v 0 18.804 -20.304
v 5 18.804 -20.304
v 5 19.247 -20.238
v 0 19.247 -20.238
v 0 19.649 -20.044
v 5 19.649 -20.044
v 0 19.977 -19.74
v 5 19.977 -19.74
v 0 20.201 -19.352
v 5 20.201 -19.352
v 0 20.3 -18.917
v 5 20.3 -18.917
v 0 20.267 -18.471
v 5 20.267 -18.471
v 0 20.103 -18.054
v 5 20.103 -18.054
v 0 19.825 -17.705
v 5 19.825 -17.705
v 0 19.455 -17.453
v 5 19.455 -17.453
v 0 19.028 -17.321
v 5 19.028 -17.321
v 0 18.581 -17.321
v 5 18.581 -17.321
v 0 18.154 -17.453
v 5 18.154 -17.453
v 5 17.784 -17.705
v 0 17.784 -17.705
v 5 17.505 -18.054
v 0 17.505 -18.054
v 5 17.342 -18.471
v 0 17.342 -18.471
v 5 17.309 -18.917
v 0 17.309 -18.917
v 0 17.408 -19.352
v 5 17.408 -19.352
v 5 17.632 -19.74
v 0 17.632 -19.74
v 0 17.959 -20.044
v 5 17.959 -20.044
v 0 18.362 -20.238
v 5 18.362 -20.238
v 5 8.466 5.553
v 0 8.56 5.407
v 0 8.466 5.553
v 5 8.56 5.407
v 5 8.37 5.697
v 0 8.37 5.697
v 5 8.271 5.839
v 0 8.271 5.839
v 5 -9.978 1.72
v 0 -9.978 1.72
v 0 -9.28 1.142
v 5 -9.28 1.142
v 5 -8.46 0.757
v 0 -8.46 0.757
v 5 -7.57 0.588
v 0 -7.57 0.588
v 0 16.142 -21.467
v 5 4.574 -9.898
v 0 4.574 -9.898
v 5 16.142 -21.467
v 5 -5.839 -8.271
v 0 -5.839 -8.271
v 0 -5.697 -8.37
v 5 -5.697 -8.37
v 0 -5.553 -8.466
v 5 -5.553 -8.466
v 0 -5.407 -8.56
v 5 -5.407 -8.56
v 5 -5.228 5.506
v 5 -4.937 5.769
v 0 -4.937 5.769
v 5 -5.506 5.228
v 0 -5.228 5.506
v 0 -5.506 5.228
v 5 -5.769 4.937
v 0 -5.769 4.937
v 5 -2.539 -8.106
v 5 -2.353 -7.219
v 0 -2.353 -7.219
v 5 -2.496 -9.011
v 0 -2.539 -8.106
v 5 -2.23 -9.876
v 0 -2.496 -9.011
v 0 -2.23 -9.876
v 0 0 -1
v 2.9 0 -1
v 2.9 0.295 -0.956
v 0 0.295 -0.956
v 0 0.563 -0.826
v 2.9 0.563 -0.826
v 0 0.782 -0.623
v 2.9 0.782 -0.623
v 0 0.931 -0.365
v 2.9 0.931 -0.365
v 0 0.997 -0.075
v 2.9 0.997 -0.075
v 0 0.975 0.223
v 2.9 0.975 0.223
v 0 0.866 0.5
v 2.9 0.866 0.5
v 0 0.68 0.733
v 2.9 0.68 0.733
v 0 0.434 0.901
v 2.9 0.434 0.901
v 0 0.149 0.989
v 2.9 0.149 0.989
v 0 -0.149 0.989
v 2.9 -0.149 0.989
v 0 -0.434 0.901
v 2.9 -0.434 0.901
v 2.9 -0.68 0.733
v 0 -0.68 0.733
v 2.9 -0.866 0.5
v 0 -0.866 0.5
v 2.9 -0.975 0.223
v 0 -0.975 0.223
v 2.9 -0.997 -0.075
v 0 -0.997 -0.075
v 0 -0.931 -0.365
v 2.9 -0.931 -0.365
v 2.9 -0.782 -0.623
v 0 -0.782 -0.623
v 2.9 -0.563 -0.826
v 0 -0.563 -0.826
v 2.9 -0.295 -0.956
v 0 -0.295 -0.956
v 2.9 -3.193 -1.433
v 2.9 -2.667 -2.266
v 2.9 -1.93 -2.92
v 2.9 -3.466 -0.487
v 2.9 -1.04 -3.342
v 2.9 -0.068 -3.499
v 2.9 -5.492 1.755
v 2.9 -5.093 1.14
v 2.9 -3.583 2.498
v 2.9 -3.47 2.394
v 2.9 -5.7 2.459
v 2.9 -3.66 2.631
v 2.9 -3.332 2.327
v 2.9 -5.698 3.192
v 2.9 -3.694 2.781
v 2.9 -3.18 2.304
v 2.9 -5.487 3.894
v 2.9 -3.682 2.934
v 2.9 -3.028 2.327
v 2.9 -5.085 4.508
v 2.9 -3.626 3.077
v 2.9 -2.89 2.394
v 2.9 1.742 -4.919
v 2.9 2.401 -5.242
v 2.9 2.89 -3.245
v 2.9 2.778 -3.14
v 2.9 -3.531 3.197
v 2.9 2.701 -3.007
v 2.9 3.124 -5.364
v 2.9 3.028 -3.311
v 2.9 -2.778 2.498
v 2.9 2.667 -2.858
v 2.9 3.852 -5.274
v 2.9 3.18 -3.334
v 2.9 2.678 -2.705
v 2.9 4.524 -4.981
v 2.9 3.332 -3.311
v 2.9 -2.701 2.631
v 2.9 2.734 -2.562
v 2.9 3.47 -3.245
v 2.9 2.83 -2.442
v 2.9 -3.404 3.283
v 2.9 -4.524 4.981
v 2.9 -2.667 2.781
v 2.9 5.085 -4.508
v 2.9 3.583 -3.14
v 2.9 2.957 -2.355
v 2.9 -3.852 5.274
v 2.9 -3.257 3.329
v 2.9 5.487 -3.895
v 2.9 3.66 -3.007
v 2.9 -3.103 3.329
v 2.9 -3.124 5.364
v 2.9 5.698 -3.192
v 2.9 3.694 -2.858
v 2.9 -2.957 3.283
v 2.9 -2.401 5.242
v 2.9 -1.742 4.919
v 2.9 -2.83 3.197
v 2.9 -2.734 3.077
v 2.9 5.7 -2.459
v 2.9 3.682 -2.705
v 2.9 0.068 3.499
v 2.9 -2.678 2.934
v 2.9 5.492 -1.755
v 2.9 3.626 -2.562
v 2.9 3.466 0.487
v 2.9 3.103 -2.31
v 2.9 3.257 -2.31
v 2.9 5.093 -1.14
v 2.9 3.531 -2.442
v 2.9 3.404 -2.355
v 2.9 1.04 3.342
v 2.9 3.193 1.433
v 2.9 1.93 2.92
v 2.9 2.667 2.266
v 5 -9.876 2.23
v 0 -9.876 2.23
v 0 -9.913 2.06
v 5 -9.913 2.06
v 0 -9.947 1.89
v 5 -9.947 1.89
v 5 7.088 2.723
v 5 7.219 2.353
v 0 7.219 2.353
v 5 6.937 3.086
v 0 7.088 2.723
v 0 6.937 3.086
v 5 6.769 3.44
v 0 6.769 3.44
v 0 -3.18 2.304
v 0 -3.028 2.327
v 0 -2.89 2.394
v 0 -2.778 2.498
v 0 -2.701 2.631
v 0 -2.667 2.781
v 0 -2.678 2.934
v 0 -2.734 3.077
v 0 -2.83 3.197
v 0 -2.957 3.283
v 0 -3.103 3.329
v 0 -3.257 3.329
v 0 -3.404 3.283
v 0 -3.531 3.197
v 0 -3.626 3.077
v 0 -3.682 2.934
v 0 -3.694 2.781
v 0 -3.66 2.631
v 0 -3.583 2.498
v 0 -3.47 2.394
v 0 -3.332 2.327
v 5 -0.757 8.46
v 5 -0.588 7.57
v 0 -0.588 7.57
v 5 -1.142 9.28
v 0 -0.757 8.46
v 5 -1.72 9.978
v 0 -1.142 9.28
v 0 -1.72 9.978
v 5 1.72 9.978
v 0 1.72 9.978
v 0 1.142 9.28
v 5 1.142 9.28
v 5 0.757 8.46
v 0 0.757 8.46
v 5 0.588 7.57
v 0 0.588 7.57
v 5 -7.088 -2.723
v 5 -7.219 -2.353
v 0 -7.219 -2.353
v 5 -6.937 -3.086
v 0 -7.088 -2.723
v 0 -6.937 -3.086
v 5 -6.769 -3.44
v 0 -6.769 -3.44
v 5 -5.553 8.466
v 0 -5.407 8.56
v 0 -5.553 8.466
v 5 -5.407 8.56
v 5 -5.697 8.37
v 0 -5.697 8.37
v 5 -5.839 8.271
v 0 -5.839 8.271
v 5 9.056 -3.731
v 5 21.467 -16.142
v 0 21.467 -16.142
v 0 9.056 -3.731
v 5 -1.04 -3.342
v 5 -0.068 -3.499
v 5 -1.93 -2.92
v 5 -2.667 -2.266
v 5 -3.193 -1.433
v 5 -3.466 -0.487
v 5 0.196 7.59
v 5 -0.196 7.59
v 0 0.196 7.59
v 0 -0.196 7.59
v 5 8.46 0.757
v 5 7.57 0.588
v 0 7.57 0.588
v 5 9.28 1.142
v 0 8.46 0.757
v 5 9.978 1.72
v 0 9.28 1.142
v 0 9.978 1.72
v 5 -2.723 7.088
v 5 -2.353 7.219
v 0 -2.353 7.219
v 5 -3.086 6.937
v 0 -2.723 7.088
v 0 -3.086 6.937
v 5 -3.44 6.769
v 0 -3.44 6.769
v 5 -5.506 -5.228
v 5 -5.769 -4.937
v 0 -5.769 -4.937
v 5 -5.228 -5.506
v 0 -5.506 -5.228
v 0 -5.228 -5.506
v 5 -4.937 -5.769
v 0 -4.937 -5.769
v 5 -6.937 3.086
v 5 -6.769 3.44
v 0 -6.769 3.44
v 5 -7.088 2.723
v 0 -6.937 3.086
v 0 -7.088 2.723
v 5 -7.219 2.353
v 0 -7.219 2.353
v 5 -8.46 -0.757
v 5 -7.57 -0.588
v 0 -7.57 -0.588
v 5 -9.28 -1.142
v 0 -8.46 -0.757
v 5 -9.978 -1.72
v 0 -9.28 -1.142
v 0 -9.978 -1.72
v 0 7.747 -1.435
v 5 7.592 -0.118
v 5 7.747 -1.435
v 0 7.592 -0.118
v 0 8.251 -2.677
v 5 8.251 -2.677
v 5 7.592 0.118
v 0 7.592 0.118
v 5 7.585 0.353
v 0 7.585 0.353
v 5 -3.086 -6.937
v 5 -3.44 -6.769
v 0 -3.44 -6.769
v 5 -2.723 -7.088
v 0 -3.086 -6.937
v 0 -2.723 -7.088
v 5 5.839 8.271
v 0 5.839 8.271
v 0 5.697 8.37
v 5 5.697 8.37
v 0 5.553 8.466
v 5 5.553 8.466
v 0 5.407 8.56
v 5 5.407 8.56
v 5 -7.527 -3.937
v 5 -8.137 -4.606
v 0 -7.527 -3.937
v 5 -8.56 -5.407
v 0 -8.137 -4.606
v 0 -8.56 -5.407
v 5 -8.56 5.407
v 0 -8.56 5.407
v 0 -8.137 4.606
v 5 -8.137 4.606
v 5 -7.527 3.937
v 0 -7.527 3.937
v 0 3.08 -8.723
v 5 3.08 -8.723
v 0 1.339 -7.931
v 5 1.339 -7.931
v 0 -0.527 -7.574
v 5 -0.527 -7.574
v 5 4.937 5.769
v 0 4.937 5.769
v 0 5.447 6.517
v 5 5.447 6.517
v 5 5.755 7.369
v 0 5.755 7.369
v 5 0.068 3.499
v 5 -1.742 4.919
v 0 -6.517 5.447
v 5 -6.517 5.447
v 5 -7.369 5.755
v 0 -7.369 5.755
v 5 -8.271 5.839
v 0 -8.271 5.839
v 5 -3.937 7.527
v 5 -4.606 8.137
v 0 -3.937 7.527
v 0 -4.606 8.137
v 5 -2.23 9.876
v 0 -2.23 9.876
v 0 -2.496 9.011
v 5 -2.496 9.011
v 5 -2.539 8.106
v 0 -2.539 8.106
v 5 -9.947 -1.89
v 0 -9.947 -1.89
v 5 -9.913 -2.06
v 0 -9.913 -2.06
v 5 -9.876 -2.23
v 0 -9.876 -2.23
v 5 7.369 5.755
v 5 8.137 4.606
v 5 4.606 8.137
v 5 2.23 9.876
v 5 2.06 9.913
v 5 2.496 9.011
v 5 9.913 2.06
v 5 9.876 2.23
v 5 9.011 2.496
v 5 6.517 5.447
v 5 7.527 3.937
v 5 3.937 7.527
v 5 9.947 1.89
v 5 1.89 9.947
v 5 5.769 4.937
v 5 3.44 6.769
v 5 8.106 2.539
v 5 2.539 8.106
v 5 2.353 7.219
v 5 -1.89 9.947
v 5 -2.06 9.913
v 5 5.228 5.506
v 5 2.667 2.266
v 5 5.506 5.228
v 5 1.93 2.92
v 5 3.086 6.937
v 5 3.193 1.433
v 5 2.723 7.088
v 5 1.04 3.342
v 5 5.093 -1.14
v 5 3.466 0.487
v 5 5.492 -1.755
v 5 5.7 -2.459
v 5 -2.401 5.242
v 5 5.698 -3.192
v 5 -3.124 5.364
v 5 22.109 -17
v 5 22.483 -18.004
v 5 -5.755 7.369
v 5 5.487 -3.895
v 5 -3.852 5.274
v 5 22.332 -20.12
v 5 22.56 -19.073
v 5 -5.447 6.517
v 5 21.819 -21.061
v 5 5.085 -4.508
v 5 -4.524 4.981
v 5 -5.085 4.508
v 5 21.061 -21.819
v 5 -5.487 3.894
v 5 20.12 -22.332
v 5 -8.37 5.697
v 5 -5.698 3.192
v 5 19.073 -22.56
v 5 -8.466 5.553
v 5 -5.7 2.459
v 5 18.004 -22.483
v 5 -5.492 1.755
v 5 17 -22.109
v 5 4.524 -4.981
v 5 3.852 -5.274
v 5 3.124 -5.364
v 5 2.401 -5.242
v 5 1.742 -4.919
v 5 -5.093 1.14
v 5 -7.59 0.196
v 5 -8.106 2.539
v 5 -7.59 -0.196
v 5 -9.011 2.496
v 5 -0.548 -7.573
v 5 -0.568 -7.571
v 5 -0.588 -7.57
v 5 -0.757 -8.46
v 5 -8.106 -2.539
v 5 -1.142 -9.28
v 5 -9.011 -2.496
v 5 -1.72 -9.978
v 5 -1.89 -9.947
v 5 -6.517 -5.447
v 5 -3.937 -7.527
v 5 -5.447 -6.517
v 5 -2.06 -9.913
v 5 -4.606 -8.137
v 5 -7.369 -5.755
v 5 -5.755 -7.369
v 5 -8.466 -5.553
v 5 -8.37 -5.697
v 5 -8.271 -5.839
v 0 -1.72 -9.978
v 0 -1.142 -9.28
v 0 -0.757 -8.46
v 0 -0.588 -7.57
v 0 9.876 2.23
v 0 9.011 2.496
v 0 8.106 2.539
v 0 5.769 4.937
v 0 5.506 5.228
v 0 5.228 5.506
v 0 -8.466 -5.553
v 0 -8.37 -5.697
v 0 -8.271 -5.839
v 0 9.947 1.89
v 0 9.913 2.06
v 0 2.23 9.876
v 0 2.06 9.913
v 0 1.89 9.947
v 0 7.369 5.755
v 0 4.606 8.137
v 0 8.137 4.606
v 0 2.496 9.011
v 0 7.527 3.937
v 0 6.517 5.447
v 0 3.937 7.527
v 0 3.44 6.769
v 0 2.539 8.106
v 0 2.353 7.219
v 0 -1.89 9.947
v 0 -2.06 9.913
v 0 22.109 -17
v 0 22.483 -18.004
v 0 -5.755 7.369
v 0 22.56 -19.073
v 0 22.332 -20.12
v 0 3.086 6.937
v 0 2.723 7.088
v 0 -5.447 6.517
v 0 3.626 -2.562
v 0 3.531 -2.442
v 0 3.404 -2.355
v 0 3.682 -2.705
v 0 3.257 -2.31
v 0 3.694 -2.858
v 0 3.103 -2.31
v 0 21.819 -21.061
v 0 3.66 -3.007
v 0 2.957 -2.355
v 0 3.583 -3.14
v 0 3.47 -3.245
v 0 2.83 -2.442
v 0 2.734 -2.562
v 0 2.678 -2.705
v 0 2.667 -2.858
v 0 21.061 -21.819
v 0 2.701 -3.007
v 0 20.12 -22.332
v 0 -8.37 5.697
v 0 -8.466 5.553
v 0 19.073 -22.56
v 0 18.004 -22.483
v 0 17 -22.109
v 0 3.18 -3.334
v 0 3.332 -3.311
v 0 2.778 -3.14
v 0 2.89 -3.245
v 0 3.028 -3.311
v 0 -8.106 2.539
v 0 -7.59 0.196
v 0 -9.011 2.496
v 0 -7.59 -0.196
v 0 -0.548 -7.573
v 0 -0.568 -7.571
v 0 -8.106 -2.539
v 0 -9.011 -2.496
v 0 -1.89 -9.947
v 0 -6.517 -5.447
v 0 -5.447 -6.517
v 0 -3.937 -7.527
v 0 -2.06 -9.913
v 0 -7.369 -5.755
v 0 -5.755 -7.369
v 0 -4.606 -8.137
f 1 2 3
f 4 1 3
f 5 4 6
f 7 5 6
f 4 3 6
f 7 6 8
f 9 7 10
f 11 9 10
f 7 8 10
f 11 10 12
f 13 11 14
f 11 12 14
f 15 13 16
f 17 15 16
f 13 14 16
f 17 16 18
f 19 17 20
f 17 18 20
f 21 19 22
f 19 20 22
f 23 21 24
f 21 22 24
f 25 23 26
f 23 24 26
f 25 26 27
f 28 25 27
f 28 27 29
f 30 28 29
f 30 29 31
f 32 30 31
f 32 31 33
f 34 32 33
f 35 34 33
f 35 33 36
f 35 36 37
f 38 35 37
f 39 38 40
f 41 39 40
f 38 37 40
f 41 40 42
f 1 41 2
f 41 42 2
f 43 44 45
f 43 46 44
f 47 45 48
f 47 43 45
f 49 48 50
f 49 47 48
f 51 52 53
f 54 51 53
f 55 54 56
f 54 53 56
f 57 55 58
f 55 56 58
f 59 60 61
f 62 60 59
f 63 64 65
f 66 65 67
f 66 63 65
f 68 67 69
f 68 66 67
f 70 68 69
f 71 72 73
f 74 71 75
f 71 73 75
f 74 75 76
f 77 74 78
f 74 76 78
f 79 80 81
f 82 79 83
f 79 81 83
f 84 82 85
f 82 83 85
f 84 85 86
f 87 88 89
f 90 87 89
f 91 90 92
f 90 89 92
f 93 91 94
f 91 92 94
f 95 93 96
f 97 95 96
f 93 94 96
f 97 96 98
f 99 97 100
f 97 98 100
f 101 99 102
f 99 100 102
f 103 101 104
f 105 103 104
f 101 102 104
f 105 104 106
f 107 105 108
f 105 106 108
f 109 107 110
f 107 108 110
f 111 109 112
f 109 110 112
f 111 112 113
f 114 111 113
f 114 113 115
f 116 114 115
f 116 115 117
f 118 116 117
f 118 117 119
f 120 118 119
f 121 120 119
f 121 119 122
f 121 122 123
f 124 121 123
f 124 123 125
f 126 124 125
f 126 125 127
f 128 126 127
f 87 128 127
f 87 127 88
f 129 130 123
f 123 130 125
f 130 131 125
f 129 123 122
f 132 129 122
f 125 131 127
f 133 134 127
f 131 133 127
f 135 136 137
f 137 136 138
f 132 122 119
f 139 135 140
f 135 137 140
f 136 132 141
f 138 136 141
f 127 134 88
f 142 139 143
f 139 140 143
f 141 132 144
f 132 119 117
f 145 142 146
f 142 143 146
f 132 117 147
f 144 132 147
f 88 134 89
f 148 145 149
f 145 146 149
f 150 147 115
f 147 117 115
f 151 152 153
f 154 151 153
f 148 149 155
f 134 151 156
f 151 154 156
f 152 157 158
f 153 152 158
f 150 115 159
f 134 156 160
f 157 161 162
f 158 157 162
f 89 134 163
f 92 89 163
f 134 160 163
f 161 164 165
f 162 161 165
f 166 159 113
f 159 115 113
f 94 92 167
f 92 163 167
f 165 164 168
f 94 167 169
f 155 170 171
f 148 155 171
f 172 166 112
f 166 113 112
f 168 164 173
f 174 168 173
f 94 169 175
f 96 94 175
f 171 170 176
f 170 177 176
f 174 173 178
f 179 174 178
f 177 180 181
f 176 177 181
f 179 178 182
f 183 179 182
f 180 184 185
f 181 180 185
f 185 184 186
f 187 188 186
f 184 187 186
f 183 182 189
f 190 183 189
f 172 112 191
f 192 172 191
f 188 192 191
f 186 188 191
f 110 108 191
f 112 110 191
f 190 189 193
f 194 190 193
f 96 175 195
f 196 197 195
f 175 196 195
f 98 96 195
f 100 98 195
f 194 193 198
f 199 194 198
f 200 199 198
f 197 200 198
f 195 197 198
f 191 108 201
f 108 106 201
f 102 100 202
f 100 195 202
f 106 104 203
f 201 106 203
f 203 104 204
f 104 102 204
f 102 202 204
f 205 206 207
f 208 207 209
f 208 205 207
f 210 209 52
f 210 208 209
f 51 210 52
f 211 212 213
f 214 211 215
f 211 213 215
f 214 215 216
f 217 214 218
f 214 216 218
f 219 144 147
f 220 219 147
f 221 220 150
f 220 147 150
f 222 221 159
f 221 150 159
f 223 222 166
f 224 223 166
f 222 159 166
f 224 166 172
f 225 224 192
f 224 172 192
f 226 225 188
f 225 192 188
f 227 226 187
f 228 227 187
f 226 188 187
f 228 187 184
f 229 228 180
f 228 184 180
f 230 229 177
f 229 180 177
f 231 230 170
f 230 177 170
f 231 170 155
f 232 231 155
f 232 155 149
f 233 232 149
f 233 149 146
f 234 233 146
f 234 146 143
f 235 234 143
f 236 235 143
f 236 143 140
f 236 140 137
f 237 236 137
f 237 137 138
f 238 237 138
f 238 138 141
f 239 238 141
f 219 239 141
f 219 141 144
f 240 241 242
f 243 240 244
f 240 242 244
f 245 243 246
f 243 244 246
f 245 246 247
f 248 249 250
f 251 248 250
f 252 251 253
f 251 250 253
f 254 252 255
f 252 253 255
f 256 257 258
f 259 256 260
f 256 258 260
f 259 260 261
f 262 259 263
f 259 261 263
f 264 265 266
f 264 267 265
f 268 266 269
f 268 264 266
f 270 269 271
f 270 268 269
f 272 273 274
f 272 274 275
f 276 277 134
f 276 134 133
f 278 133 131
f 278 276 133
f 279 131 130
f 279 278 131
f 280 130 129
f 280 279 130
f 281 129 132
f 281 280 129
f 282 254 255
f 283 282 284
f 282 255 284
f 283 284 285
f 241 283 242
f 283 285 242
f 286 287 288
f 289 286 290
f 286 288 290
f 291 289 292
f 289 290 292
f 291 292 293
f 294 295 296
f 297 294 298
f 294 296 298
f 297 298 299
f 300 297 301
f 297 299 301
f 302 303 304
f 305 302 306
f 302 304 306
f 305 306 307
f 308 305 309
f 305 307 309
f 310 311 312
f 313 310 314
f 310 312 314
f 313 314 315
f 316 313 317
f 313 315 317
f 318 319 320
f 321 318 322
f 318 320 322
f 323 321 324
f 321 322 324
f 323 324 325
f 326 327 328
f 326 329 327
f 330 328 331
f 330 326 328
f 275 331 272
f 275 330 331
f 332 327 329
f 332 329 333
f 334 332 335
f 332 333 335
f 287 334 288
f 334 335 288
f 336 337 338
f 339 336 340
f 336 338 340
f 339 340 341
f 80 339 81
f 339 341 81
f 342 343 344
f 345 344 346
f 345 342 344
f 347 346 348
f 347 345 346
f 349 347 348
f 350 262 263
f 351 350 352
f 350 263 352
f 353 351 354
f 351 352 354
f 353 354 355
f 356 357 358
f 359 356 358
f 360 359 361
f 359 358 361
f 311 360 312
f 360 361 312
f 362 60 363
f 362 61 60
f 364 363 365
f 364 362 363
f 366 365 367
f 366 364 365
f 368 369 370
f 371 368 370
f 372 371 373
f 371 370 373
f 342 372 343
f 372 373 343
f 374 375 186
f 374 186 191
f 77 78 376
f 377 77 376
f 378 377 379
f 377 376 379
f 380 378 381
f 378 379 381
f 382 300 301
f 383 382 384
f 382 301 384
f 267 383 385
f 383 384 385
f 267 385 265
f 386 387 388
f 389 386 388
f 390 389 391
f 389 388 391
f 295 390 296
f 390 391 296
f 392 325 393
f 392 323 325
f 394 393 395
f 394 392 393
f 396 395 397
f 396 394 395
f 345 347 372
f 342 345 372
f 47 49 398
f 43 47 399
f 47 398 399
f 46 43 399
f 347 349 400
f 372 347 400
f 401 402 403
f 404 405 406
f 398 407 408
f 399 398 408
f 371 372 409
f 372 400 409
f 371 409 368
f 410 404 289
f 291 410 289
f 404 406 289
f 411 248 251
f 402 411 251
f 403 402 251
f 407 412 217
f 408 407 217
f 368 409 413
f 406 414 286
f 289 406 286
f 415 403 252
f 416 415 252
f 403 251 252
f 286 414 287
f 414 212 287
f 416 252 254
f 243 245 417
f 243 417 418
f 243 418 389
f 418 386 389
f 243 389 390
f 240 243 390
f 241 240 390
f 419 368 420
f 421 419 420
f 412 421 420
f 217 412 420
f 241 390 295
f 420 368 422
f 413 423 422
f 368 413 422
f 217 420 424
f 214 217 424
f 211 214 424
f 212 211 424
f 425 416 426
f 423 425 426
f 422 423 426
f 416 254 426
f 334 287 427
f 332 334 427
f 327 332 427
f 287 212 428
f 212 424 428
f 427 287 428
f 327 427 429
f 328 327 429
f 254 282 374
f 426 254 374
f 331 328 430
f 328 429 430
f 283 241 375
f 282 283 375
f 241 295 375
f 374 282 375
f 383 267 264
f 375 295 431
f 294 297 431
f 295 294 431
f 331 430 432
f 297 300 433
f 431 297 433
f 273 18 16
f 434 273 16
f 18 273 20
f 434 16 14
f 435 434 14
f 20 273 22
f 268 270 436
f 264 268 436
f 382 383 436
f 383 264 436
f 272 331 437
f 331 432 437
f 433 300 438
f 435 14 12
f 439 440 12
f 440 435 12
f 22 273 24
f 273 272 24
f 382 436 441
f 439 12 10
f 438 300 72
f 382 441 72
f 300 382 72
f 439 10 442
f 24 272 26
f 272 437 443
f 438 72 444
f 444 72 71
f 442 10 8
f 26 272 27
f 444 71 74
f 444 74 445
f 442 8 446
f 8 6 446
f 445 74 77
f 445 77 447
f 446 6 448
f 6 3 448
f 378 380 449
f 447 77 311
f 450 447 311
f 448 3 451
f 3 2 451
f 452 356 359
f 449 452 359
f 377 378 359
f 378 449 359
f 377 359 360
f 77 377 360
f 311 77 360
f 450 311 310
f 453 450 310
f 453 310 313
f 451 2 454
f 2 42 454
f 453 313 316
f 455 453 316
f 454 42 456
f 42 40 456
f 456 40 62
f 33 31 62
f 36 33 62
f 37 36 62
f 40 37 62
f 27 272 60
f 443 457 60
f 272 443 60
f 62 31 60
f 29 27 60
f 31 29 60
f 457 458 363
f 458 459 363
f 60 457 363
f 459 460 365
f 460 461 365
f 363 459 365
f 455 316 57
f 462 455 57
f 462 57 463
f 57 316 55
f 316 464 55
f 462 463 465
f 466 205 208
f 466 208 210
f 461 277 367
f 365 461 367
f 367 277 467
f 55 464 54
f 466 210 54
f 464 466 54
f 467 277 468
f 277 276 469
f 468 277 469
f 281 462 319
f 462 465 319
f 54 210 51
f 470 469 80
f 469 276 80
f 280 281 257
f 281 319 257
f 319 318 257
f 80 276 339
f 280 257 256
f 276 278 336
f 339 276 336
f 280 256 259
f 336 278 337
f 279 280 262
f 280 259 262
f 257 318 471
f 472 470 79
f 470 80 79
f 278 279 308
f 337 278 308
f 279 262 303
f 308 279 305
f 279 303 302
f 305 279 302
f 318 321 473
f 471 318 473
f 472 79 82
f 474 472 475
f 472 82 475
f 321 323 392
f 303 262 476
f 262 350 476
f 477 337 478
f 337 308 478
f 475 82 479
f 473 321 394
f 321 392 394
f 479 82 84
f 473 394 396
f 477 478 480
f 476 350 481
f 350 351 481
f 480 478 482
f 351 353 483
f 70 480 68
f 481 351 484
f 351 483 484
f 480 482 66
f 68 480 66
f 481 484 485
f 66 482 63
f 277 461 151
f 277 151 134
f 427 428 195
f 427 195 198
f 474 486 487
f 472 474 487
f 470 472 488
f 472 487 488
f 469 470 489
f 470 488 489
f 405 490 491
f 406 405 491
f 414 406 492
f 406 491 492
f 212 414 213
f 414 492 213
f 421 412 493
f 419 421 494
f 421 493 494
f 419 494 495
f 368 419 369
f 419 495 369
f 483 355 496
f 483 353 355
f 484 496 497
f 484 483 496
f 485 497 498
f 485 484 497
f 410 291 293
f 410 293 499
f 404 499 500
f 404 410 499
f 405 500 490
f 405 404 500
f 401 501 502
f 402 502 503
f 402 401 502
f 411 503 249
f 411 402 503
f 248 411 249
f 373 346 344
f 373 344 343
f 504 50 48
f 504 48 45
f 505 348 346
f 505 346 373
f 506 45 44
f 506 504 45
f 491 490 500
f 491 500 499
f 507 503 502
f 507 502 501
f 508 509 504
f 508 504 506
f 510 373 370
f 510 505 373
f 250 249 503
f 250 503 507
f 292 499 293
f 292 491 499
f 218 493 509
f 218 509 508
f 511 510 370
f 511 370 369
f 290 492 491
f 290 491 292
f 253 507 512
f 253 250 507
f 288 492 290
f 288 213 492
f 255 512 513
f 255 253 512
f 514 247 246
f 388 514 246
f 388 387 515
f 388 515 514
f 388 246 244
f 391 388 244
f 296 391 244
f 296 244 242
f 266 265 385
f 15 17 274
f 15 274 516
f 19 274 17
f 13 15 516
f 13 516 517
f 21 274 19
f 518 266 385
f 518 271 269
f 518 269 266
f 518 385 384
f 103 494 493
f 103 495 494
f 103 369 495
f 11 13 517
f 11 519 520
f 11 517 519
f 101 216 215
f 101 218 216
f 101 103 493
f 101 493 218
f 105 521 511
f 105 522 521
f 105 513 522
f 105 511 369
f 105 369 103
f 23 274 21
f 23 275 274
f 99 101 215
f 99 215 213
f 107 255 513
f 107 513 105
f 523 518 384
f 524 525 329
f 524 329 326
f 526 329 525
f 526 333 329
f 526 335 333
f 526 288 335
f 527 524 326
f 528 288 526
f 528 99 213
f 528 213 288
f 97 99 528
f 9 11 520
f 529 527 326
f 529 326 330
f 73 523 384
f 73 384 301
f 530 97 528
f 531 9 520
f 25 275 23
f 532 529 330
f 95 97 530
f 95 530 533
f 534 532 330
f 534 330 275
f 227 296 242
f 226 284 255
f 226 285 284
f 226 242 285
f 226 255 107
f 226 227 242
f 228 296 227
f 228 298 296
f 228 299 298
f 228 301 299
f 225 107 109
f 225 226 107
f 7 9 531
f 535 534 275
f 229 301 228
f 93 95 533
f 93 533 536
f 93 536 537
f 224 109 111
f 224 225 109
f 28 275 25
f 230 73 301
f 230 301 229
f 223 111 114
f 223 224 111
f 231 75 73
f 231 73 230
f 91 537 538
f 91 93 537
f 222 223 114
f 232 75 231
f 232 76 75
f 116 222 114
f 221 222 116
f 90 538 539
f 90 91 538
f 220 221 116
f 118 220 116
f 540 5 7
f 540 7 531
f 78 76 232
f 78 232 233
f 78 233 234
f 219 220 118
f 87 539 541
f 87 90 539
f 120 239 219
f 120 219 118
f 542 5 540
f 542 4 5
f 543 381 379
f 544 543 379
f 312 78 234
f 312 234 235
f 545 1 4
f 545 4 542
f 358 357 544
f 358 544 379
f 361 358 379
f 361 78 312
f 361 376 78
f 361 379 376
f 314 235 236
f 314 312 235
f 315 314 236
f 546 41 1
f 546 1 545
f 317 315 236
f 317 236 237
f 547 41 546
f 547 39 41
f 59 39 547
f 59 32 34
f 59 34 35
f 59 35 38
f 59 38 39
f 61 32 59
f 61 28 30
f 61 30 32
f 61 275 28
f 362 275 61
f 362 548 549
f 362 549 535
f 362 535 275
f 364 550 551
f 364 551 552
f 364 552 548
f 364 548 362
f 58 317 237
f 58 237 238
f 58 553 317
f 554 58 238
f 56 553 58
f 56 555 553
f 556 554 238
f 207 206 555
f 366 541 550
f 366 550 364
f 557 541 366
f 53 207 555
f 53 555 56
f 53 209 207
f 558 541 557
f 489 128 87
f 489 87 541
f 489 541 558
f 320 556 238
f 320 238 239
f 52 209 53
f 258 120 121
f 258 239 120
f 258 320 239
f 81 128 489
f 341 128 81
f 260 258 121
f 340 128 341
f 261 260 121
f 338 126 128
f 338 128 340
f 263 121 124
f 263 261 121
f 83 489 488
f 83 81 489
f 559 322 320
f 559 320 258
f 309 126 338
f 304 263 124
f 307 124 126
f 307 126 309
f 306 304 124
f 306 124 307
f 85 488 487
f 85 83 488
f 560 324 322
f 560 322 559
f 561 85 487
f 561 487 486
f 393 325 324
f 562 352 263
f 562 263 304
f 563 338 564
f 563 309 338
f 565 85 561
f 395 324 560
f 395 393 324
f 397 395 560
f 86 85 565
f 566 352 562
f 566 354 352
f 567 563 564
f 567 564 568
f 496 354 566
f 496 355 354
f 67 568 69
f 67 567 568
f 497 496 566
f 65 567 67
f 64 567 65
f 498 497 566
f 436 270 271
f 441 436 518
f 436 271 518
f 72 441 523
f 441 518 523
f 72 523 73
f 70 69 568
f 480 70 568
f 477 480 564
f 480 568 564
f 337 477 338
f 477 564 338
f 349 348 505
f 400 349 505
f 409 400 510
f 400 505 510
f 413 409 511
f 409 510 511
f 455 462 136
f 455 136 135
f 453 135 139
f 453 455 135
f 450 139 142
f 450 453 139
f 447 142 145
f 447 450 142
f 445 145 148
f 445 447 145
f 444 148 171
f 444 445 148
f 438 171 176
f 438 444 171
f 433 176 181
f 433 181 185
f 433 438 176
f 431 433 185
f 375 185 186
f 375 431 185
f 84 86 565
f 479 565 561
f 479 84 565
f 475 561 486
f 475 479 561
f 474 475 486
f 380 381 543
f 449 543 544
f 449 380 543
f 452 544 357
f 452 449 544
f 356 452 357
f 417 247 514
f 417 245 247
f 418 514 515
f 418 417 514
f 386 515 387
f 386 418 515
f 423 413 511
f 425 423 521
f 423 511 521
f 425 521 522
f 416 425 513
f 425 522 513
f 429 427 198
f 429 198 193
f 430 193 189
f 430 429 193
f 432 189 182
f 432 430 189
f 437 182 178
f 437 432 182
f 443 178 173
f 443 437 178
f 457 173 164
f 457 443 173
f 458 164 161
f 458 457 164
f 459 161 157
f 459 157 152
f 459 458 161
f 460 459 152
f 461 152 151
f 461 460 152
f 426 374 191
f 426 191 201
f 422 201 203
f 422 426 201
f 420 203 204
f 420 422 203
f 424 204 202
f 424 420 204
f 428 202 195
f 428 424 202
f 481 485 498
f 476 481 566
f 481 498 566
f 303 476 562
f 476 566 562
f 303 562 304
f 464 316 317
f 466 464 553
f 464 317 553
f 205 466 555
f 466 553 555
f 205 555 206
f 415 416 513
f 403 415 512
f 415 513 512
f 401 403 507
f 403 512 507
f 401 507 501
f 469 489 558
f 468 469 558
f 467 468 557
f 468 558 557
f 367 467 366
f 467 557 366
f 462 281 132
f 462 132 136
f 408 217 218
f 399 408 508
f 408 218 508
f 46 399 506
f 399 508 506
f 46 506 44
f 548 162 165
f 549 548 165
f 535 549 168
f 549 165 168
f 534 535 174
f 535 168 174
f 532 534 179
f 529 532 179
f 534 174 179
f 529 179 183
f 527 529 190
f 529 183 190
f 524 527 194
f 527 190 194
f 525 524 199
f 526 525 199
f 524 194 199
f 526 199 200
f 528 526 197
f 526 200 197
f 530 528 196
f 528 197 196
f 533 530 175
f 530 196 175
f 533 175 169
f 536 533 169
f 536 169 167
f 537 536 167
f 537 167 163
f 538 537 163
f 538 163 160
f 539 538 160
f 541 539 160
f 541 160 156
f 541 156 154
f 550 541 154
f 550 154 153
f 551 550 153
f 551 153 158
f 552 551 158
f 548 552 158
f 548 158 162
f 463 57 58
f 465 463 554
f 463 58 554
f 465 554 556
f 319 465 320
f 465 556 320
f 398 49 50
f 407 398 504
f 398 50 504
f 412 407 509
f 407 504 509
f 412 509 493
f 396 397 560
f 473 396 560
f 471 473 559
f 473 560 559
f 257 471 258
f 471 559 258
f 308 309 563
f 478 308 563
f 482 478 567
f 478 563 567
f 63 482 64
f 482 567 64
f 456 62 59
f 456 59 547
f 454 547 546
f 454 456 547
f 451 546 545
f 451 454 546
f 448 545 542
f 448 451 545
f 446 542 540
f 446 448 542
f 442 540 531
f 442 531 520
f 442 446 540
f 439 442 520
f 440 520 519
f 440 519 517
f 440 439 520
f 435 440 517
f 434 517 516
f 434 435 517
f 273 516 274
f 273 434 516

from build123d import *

# Parameters (mm, degrees)
BASPROSKE_W             = 5
BASPROSKE_H             = 10.125
TOOTHCUT_DEPTH          = 16.166781135
TEETHCUTS_COUNT         = 13
TEETHCUTS_ANGLE         = 270
BORSKE_R                = 2.5
BORE_DEPTH              = 50.0000508
ENL_V_START             = -10
ENL_V_MAT_EXTRU_1_DEPTH = 10
ESQUISSE2_R             = 1.5
BOSS_EXTRU_1_DEPTH      = 5
BOSS_EXTRU_2_START      = -1
ESQUISSE3_R             = 2.5
BOSS_EXTRU_2_DEPTH      = 4
ESQUISSE4_R             = 1
ENL_V_MAT_EXTRU_2_DEPTH = 10
CONG_1_R                = 5
CONG_2_R                = 8
ENL_V_MAT_EXTRU_4_DEPTH = 2.1
ESQUISSE8_R             = 0.515
ENL_V_MAT_EXTRU_5_DEPTH = 33.049570744


with BuildPart() as part:
    # BasProSke → Base-Revolve (revolve)
    with BuildSketch(Plane(origin=(0, 0, 0), x_dir=(1, 0, 0), z_dir=(0, 1, 0)), mode=Mode.PRIVATE) as base_revolve_sk:
        with Locations((2.5, 5.0625)):
            Rectangle(BASPROSKE_W, BASPROSKE_H)
    revolve(base_revolve_sk.sketch.rotate(Axis((-10, 0, 0), (1, 0, 0)), 180), axis=Axis((-10, 0, 0), (1, 0, 0)))

    # TooCutSke → ToothCut (cut, through all)
    with BuildSketch(Plane(origin=(0, 0, 0), x_dir=(0, 0, -1), z_dir=(1, 0, 0))):
        with BuildLine():
            ThreePointArc((0.588166249, 7.56993481), (0, 7.59275), (-0.588166249, 7.56993481))
            ThreePointArc((-0.588166249, 7.56993481), (-0.930156891, 8.896709021), (-1.743114395, 9.999608611))
            ThreePointArc((-1.743114395, 9.999608611), (0, 10.1504), (1.743114395, 9.999608611))
            ThreePointArc((1.743114395, 9.999608611), (0.930156891, 8.896709021), (0.588166249, 7.56993481))
        make_face()
    toothcut = extrude(amount=TOOTHCUT_DEPTH, mode=Mode.SUBTRACT)

    # TeethCuts: ToothCut ×13 about axis
    teethcuts_axis = Axis((-10, 0, 0), (1, 0, 0))
    for i in range(1, TEETHCUTS_COUNT):
        add(toothcut.rotate(teethcuts_axis, i * TEETHCUTS_ANGLE / (TEETHCUTS_COUNT - 1)), mode=Mode.SUBTRACT)

    # BorSke → Bore (cut, symmetric)
    with BuildSketch(Plane(origin=(0, 0, 0), x_dir=(0, 0, -1), z_dir=(1, 0, 0))):
        with Locations(Location((0, 0, 0), (0, 0, 180))):
            Circle(BORSKE_R)
    extrude(amount=BORE_DEPTH, both=True, mode=Mode.SUBTRACT)

    # Esquisse1 → Enlèv. mat.-Extru.1 (cut)
    with BuildSketch(Plane(origin=(5, 0, 0), x_dir=(0, 0, -1), z_dir=(1, 0, 0)).offset(ENL_V_START)):
        with BuildLine():
            ThreePointArc((7.56993481, 0.588166249), (5.368885013, 5.368885013), (0.588166249, 7.56993481))
            ThreePointArc((0.588166249, 7.56993481), (0.923336805, 8.882279141), (1.719727125, 9.977883724))
            ThreePointArc((1.719727125, 9.977883724), (7.15945616, 7.15945616), (9.977883724, 1.719727125))
            ThreePointArc((9.977883724, 1.719727125), (8.882279141, 0.923336805), (7.56993481, 0.588166249))
        make_face()
    extrude(amount=ENL_V_MAT_EXTRU_1_DEPTH, mode=Mode.SUBTRACT)

    # Esquisse2 → Boss.-Extru.1 (add, through all)
    with BuildSketch(Plane(origin=(5, 0, 0), x_dir=(0, 0, -1), z_dir=(1, 0, 0))):
        with BuildLine():
            Line((16.142135624, 21.46674159), (2, 7.324605966))
            ThreePointArc((2, 7.324605966), (5.368885013, 5.368885013), (7.324605966, 2))
            Line((7.324605966, 2), (21.46674159, 16.142135624))
            ThreePointArc((21.46674159, 16.142135624), (21.46674159, 21.46674159), (16.142135624, 21.46674159))
        make_face()
        with Locations((18.804438607, 18.804438607)):
            Circle(ESQUISSE2_R, mode=Mode.SUBTRACT)
    extrude(amount=-BOSS_EXTRU_1_DEPTH)

    # Esquisse3 → Boss.-Extru.2 (add, through all)
    with BuildSketch(Plane(origin=(5, 0, 0), x_dir=(0, 0, -1), z_dir=(1, 0, 0)).offset(BOSS_EXTRU_2_START)):
        with Locations(Location((0, 0, 0), (0, 0, 180))):
            Circle(ESQUISSE3_R)
    extrude(amount=-BOSS_EXTRU_2_DEPTH)

    # Esquisse4 → Enlèv. mat.-Extru.2 (cut)
    with BuildSketch(Plane(origin=(4, 0, 0), x_dir=(0, 0, -1), z_dir=(1, 0, 0))):
        Circle(ESQUISSE4_R)
    extrude(amount=-ENL_V_MAT_EXTRU_2_DEPTH, mode=Mode.SUBTRACT)

    # Congé1
    cong_1_edges = [part.edges().sort_by_distance(p)[0] for p in [
        (2.5, 7.324605966, -2),
    ]]
    fillet(cong_1_edges, radius=CONG_1_R)

    # Congé2
    cong_2_edges = [part.edges().sort_by_distance(p)[0] for p in [
        (2.5, 2, -7.324605966),
    ]]
    fillet(cong_2_edges, radius=CONG_2_R)

    # Esquisse6 → Enlèv. mat.-Extru.4 (cut)
    with BuildSketch(Plane(origin=(5, 0, 0), x_dir=(0, 0, -1), z_dir=(1, 0, 0))):
        with BuildLine():
            Line((-0.486746212, 3.465988766), (1.140136775, 5.092871753))
            ThreePointArc((1.140136775, 5.092871753), (4.507727263, 5.08472958), (4.91940393, 1.742386942))
            Line((4.91940393, 1.742386942), (3.499344691, -0.067725445))
            ThreePointArc((3.499344691, -0.067725445), (2.619022446, -2.321792719), (0.486746212, -3.465988766))
            Line((0.486746212, -3.465988766), (-1.140072016, -5.092806994))
            ThreePointArc((-1.140072016, -5.092806994), (-4.507662796, -5.08478673), (-4.919460458, -1.742458998))
            Line((-4.919460458, -1.742458998), (-3.499344691, 0.067725445))
            ThreePointArc((-3.499344691, 0.067725445), (-2.619022446, 2.321792719), (-0.486746212, 3.465988766))
        make_face()
    extrude(amount=-ENL_V_MAT_EXTRU_4_DEPTH, mode=Mode.SUBTRACT)

    # Esquisse8 → Enlèv. mat.-Extru.5 (cut, through all)
    with BuildSketch(Plane(origin=(2.9, 0, 0), x_dir=(0, 0, -1), z_dir=(1, 0, 0))):
        with Locations((-2.81931973, -3.180241541)):
            Circle(ESQUISSE8_R)
        with Locations((2.81931973, 3.180241541)):
            Circle(ESQUISSE8_R)
    extrude(amount=-ENL_V_MAT_EXTRU_5_DEPTH, mode=Mode.SUBTRACT)


solid = part.part
